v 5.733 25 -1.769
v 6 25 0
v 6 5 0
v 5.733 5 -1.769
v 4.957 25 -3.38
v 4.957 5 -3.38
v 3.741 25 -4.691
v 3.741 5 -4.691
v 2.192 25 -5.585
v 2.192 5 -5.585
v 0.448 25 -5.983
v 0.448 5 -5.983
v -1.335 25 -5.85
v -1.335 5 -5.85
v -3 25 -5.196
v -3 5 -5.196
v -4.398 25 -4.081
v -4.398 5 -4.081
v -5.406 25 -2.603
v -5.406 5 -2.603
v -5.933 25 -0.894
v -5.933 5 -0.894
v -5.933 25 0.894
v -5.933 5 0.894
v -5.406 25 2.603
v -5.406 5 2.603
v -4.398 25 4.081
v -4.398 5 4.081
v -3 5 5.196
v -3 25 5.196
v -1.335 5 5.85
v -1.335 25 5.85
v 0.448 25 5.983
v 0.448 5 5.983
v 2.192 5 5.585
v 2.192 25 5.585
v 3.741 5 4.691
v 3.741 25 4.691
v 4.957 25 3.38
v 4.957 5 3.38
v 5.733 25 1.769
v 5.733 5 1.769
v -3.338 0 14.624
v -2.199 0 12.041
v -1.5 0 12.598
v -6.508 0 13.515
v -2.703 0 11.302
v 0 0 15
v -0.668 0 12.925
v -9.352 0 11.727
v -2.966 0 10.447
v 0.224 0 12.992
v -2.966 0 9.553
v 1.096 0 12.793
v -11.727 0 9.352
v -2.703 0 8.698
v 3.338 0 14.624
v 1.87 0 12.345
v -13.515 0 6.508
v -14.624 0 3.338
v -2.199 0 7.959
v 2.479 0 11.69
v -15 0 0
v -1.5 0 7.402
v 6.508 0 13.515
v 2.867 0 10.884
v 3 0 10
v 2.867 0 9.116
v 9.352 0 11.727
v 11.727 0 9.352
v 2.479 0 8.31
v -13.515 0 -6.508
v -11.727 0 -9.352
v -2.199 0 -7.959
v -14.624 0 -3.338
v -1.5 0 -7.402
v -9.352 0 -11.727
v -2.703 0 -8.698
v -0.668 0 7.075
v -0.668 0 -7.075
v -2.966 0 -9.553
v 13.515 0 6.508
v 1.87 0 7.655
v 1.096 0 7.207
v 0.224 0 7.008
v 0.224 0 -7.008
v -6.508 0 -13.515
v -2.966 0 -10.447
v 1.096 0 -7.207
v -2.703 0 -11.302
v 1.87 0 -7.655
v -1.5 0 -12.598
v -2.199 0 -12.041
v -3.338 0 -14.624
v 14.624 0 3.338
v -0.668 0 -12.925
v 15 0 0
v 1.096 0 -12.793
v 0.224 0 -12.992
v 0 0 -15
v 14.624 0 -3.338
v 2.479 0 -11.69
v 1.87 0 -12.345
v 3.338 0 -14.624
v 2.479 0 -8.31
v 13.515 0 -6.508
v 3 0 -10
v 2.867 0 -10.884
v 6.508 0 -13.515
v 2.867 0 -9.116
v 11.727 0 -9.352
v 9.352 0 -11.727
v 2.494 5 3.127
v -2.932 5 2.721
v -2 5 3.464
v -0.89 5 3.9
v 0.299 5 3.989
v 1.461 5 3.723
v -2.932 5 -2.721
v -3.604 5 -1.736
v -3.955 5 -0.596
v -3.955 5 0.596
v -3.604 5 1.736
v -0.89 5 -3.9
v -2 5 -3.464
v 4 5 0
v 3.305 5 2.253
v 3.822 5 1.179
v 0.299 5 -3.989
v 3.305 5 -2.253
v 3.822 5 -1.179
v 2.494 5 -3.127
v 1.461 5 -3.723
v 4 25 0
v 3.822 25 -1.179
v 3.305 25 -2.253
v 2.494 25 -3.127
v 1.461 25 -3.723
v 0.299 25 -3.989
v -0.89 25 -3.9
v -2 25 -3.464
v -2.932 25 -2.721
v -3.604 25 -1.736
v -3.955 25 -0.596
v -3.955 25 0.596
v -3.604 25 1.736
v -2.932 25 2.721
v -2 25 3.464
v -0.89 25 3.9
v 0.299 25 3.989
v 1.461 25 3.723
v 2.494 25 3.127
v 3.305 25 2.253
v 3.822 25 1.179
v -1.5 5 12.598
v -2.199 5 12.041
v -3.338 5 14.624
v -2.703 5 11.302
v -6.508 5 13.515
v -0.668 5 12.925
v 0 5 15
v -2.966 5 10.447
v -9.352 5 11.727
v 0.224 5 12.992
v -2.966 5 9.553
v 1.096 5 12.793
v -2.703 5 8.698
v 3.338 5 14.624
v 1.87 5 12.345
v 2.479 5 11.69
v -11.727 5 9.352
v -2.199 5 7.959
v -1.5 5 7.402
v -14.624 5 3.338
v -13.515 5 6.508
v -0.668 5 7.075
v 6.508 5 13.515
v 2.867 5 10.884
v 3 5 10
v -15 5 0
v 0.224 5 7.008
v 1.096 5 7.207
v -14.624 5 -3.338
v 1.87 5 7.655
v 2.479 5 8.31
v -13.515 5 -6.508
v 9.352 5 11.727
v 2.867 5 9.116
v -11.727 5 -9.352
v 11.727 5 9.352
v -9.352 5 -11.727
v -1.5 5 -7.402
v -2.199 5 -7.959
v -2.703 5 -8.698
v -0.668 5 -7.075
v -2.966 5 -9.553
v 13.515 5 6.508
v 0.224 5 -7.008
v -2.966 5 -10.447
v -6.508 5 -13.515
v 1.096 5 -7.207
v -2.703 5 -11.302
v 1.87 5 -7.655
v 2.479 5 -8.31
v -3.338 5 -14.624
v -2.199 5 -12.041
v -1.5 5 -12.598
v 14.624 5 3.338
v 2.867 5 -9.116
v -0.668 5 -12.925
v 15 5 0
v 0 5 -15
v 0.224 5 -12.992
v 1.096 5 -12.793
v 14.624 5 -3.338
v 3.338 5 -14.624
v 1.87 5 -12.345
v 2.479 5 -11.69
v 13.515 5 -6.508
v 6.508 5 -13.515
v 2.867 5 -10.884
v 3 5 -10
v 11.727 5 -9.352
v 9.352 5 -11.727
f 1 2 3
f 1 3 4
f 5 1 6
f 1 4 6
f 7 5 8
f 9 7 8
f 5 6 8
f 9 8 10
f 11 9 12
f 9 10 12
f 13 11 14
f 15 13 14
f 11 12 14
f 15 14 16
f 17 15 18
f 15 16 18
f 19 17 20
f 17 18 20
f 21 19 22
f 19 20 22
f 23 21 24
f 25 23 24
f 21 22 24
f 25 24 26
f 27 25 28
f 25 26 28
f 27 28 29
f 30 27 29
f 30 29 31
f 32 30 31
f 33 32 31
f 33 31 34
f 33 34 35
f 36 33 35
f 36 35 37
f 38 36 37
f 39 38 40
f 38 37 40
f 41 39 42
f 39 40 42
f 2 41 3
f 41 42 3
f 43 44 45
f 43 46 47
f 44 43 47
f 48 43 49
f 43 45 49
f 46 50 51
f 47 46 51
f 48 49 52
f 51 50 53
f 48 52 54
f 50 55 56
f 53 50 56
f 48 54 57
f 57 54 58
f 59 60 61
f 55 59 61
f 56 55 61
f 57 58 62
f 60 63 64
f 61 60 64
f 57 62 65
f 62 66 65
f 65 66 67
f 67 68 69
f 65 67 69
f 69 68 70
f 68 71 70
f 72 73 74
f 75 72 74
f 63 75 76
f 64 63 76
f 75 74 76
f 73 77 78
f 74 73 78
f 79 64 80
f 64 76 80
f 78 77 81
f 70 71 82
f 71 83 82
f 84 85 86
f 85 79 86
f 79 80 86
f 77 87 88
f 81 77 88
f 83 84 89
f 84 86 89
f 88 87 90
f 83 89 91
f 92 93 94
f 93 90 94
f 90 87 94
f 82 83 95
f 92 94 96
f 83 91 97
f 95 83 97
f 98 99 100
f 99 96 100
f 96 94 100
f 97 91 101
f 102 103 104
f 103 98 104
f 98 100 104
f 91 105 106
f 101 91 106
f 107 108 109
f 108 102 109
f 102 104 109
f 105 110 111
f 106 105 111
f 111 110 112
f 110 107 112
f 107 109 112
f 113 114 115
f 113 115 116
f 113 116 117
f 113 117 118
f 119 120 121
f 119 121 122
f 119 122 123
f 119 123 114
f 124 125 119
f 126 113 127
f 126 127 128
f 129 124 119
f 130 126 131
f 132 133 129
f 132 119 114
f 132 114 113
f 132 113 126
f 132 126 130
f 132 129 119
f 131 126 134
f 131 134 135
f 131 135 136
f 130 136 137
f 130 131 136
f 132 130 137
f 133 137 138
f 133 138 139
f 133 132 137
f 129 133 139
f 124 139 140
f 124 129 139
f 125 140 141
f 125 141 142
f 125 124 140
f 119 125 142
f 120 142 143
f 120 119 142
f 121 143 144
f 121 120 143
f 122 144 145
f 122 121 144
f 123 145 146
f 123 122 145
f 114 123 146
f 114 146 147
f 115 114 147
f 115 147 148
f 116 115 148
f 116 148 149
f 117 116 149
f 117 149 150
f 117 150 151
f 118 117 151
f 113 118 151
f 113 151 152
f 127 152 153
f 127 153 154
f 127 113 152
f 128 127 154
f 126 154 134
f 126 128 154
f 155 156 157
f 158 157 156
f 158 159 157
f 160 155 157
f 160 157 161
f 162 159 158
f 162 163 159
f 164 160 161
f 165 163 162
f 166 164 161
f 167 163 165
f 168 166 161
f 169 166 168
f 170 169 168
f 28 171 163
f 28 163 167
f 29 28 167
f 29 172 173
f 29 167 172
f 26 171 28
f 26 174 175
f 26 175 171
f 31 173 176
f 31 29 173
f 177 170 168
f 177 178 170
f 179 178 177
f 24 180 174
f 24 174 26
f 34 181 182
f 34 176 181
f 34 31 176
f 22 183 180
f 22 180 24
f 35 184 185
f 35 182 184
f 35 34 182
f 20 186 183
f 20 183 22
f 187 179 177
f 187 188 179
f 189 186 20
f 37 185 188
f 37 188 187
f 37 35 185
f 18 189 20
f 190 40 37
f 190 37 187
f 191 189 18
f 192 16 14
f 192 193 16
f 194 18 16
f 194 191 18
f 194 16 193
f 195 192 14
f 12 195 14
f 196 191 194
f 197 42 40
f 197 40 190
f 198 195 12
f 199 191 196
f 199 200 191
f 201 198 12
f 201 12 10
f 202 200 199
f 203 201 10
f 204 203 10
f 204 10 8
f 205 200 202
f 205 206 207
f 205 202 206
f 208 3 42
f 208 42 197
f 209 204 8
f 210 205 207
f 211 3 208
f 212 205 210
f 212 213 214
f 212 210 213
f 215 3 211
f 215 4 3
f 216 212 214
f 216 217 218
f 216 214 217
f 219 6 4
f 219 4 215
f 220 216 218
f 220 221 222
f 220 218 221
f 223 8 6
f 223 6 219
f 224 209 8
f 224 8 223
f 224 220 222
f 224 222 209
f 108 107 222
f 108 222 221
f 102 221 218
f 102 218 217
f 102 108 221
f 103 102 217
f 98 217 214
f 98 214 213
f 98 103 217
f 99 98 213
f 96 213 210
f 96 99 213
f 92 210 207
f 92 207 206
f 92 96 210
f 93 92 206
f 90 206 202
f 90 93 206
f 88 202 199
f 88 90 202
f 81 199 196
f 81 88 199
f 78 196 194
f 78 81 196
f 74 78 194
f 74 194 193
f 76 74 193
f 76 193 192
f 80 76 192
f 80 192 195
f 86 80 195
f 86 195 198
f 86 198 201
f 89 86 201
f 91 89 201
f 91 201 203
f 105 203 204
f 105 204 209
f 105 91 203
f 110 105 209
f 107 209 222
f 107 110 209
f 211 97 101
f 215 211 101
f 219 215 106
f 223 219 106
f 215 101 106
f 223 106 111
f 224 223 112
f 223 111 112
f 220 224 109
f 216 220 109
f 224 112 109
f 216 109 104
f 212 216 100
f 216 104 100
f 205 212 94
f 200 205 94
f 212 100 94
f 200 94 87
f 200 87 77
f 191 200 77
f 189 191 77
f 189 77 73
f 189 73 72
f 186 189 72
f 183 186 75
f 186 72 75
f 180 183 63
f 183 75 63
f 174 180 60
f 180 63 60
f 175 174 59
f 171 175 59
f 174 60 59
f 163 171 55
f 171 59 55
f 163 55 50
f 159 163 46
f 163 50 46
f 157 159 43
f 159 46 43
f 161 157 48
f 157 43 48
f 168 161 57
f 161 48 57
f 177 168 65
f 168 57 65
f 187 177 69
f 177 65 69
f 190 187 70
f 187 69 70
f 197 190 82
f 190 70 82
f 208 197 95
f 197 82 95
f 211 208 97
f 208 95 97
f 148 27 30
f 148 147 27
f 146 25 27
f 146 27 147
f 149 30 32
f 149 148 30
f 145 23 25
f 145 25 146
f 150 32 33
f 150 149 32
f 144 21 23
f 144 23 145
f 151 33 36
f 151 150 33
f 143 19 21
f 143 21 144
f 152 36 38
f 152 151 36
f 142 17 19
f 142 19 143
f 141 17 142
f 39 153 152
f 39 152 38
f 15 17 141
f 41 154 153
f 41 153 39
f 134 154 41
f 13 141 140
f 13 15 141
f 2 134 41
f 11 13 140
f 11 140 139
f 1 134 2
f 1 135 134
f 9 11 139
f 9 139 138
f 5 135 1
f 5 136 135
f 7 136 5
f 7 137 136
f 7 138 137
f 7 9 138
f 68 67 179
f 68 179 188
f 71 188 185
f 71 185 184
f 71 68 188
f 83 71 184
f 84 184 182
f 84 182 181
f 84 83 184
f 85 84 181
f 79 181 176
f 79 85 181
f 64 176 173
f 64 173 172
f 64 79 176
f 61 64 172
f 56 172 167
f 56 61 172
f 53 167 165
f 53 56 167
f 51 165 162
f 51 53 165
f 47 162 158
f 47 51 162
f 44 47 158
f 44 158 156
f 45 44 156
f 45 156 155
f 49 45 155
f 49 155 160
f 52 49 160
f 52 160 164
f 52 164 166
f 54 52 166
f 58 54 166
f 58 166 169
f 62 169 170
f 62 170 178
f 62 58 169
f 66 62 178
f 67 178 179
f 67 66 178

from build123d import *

# Parameters (mm, degrees)
SKETCH1_R           = 15
SKETCH1_R_2         = 3
BOSS_EXTRUDE1_DEPTH = 5
SKETCH2_R           = 6
SKETCH2_R_2         = 4
BOSS_EXTRUDE2_DEPTH = 20


with BuildPart() as part:
    # Sketch1 → Boss-Extrude1 (new body)
    with BuildSketch(Plane(origin=(0, 0, 0), x_dir=(1, 0, 0), z_dir=(0, 1, 0))):
        Circle(SKETCH1_R)
        with Locations((0, 10)):
            Circle(SKETCH1_R_2, mode=Mode.SUBTRACT)
        with Locations((0, -10)):
            Circle(SKETCH1_R_2, mode=Mode.SUBTRACT)
    extrude(amount=BOSS_EXTRUDE1_DEPTH)

    # Sketch2 → Boss-Extrude2 (add)
    with BuildSketch(Plane(origin=(0, 5, 0), x_dir=(1, 0, 0), z_dir=(0, 1, 0))):
        Circle(SKETCH2_R)
        Circle(SKETCH2_R_2, mode=Mode.SUBTRACT)
    extrude(amount=BOSS_EXTRUDE2_DEPTH)


solid = part.part
